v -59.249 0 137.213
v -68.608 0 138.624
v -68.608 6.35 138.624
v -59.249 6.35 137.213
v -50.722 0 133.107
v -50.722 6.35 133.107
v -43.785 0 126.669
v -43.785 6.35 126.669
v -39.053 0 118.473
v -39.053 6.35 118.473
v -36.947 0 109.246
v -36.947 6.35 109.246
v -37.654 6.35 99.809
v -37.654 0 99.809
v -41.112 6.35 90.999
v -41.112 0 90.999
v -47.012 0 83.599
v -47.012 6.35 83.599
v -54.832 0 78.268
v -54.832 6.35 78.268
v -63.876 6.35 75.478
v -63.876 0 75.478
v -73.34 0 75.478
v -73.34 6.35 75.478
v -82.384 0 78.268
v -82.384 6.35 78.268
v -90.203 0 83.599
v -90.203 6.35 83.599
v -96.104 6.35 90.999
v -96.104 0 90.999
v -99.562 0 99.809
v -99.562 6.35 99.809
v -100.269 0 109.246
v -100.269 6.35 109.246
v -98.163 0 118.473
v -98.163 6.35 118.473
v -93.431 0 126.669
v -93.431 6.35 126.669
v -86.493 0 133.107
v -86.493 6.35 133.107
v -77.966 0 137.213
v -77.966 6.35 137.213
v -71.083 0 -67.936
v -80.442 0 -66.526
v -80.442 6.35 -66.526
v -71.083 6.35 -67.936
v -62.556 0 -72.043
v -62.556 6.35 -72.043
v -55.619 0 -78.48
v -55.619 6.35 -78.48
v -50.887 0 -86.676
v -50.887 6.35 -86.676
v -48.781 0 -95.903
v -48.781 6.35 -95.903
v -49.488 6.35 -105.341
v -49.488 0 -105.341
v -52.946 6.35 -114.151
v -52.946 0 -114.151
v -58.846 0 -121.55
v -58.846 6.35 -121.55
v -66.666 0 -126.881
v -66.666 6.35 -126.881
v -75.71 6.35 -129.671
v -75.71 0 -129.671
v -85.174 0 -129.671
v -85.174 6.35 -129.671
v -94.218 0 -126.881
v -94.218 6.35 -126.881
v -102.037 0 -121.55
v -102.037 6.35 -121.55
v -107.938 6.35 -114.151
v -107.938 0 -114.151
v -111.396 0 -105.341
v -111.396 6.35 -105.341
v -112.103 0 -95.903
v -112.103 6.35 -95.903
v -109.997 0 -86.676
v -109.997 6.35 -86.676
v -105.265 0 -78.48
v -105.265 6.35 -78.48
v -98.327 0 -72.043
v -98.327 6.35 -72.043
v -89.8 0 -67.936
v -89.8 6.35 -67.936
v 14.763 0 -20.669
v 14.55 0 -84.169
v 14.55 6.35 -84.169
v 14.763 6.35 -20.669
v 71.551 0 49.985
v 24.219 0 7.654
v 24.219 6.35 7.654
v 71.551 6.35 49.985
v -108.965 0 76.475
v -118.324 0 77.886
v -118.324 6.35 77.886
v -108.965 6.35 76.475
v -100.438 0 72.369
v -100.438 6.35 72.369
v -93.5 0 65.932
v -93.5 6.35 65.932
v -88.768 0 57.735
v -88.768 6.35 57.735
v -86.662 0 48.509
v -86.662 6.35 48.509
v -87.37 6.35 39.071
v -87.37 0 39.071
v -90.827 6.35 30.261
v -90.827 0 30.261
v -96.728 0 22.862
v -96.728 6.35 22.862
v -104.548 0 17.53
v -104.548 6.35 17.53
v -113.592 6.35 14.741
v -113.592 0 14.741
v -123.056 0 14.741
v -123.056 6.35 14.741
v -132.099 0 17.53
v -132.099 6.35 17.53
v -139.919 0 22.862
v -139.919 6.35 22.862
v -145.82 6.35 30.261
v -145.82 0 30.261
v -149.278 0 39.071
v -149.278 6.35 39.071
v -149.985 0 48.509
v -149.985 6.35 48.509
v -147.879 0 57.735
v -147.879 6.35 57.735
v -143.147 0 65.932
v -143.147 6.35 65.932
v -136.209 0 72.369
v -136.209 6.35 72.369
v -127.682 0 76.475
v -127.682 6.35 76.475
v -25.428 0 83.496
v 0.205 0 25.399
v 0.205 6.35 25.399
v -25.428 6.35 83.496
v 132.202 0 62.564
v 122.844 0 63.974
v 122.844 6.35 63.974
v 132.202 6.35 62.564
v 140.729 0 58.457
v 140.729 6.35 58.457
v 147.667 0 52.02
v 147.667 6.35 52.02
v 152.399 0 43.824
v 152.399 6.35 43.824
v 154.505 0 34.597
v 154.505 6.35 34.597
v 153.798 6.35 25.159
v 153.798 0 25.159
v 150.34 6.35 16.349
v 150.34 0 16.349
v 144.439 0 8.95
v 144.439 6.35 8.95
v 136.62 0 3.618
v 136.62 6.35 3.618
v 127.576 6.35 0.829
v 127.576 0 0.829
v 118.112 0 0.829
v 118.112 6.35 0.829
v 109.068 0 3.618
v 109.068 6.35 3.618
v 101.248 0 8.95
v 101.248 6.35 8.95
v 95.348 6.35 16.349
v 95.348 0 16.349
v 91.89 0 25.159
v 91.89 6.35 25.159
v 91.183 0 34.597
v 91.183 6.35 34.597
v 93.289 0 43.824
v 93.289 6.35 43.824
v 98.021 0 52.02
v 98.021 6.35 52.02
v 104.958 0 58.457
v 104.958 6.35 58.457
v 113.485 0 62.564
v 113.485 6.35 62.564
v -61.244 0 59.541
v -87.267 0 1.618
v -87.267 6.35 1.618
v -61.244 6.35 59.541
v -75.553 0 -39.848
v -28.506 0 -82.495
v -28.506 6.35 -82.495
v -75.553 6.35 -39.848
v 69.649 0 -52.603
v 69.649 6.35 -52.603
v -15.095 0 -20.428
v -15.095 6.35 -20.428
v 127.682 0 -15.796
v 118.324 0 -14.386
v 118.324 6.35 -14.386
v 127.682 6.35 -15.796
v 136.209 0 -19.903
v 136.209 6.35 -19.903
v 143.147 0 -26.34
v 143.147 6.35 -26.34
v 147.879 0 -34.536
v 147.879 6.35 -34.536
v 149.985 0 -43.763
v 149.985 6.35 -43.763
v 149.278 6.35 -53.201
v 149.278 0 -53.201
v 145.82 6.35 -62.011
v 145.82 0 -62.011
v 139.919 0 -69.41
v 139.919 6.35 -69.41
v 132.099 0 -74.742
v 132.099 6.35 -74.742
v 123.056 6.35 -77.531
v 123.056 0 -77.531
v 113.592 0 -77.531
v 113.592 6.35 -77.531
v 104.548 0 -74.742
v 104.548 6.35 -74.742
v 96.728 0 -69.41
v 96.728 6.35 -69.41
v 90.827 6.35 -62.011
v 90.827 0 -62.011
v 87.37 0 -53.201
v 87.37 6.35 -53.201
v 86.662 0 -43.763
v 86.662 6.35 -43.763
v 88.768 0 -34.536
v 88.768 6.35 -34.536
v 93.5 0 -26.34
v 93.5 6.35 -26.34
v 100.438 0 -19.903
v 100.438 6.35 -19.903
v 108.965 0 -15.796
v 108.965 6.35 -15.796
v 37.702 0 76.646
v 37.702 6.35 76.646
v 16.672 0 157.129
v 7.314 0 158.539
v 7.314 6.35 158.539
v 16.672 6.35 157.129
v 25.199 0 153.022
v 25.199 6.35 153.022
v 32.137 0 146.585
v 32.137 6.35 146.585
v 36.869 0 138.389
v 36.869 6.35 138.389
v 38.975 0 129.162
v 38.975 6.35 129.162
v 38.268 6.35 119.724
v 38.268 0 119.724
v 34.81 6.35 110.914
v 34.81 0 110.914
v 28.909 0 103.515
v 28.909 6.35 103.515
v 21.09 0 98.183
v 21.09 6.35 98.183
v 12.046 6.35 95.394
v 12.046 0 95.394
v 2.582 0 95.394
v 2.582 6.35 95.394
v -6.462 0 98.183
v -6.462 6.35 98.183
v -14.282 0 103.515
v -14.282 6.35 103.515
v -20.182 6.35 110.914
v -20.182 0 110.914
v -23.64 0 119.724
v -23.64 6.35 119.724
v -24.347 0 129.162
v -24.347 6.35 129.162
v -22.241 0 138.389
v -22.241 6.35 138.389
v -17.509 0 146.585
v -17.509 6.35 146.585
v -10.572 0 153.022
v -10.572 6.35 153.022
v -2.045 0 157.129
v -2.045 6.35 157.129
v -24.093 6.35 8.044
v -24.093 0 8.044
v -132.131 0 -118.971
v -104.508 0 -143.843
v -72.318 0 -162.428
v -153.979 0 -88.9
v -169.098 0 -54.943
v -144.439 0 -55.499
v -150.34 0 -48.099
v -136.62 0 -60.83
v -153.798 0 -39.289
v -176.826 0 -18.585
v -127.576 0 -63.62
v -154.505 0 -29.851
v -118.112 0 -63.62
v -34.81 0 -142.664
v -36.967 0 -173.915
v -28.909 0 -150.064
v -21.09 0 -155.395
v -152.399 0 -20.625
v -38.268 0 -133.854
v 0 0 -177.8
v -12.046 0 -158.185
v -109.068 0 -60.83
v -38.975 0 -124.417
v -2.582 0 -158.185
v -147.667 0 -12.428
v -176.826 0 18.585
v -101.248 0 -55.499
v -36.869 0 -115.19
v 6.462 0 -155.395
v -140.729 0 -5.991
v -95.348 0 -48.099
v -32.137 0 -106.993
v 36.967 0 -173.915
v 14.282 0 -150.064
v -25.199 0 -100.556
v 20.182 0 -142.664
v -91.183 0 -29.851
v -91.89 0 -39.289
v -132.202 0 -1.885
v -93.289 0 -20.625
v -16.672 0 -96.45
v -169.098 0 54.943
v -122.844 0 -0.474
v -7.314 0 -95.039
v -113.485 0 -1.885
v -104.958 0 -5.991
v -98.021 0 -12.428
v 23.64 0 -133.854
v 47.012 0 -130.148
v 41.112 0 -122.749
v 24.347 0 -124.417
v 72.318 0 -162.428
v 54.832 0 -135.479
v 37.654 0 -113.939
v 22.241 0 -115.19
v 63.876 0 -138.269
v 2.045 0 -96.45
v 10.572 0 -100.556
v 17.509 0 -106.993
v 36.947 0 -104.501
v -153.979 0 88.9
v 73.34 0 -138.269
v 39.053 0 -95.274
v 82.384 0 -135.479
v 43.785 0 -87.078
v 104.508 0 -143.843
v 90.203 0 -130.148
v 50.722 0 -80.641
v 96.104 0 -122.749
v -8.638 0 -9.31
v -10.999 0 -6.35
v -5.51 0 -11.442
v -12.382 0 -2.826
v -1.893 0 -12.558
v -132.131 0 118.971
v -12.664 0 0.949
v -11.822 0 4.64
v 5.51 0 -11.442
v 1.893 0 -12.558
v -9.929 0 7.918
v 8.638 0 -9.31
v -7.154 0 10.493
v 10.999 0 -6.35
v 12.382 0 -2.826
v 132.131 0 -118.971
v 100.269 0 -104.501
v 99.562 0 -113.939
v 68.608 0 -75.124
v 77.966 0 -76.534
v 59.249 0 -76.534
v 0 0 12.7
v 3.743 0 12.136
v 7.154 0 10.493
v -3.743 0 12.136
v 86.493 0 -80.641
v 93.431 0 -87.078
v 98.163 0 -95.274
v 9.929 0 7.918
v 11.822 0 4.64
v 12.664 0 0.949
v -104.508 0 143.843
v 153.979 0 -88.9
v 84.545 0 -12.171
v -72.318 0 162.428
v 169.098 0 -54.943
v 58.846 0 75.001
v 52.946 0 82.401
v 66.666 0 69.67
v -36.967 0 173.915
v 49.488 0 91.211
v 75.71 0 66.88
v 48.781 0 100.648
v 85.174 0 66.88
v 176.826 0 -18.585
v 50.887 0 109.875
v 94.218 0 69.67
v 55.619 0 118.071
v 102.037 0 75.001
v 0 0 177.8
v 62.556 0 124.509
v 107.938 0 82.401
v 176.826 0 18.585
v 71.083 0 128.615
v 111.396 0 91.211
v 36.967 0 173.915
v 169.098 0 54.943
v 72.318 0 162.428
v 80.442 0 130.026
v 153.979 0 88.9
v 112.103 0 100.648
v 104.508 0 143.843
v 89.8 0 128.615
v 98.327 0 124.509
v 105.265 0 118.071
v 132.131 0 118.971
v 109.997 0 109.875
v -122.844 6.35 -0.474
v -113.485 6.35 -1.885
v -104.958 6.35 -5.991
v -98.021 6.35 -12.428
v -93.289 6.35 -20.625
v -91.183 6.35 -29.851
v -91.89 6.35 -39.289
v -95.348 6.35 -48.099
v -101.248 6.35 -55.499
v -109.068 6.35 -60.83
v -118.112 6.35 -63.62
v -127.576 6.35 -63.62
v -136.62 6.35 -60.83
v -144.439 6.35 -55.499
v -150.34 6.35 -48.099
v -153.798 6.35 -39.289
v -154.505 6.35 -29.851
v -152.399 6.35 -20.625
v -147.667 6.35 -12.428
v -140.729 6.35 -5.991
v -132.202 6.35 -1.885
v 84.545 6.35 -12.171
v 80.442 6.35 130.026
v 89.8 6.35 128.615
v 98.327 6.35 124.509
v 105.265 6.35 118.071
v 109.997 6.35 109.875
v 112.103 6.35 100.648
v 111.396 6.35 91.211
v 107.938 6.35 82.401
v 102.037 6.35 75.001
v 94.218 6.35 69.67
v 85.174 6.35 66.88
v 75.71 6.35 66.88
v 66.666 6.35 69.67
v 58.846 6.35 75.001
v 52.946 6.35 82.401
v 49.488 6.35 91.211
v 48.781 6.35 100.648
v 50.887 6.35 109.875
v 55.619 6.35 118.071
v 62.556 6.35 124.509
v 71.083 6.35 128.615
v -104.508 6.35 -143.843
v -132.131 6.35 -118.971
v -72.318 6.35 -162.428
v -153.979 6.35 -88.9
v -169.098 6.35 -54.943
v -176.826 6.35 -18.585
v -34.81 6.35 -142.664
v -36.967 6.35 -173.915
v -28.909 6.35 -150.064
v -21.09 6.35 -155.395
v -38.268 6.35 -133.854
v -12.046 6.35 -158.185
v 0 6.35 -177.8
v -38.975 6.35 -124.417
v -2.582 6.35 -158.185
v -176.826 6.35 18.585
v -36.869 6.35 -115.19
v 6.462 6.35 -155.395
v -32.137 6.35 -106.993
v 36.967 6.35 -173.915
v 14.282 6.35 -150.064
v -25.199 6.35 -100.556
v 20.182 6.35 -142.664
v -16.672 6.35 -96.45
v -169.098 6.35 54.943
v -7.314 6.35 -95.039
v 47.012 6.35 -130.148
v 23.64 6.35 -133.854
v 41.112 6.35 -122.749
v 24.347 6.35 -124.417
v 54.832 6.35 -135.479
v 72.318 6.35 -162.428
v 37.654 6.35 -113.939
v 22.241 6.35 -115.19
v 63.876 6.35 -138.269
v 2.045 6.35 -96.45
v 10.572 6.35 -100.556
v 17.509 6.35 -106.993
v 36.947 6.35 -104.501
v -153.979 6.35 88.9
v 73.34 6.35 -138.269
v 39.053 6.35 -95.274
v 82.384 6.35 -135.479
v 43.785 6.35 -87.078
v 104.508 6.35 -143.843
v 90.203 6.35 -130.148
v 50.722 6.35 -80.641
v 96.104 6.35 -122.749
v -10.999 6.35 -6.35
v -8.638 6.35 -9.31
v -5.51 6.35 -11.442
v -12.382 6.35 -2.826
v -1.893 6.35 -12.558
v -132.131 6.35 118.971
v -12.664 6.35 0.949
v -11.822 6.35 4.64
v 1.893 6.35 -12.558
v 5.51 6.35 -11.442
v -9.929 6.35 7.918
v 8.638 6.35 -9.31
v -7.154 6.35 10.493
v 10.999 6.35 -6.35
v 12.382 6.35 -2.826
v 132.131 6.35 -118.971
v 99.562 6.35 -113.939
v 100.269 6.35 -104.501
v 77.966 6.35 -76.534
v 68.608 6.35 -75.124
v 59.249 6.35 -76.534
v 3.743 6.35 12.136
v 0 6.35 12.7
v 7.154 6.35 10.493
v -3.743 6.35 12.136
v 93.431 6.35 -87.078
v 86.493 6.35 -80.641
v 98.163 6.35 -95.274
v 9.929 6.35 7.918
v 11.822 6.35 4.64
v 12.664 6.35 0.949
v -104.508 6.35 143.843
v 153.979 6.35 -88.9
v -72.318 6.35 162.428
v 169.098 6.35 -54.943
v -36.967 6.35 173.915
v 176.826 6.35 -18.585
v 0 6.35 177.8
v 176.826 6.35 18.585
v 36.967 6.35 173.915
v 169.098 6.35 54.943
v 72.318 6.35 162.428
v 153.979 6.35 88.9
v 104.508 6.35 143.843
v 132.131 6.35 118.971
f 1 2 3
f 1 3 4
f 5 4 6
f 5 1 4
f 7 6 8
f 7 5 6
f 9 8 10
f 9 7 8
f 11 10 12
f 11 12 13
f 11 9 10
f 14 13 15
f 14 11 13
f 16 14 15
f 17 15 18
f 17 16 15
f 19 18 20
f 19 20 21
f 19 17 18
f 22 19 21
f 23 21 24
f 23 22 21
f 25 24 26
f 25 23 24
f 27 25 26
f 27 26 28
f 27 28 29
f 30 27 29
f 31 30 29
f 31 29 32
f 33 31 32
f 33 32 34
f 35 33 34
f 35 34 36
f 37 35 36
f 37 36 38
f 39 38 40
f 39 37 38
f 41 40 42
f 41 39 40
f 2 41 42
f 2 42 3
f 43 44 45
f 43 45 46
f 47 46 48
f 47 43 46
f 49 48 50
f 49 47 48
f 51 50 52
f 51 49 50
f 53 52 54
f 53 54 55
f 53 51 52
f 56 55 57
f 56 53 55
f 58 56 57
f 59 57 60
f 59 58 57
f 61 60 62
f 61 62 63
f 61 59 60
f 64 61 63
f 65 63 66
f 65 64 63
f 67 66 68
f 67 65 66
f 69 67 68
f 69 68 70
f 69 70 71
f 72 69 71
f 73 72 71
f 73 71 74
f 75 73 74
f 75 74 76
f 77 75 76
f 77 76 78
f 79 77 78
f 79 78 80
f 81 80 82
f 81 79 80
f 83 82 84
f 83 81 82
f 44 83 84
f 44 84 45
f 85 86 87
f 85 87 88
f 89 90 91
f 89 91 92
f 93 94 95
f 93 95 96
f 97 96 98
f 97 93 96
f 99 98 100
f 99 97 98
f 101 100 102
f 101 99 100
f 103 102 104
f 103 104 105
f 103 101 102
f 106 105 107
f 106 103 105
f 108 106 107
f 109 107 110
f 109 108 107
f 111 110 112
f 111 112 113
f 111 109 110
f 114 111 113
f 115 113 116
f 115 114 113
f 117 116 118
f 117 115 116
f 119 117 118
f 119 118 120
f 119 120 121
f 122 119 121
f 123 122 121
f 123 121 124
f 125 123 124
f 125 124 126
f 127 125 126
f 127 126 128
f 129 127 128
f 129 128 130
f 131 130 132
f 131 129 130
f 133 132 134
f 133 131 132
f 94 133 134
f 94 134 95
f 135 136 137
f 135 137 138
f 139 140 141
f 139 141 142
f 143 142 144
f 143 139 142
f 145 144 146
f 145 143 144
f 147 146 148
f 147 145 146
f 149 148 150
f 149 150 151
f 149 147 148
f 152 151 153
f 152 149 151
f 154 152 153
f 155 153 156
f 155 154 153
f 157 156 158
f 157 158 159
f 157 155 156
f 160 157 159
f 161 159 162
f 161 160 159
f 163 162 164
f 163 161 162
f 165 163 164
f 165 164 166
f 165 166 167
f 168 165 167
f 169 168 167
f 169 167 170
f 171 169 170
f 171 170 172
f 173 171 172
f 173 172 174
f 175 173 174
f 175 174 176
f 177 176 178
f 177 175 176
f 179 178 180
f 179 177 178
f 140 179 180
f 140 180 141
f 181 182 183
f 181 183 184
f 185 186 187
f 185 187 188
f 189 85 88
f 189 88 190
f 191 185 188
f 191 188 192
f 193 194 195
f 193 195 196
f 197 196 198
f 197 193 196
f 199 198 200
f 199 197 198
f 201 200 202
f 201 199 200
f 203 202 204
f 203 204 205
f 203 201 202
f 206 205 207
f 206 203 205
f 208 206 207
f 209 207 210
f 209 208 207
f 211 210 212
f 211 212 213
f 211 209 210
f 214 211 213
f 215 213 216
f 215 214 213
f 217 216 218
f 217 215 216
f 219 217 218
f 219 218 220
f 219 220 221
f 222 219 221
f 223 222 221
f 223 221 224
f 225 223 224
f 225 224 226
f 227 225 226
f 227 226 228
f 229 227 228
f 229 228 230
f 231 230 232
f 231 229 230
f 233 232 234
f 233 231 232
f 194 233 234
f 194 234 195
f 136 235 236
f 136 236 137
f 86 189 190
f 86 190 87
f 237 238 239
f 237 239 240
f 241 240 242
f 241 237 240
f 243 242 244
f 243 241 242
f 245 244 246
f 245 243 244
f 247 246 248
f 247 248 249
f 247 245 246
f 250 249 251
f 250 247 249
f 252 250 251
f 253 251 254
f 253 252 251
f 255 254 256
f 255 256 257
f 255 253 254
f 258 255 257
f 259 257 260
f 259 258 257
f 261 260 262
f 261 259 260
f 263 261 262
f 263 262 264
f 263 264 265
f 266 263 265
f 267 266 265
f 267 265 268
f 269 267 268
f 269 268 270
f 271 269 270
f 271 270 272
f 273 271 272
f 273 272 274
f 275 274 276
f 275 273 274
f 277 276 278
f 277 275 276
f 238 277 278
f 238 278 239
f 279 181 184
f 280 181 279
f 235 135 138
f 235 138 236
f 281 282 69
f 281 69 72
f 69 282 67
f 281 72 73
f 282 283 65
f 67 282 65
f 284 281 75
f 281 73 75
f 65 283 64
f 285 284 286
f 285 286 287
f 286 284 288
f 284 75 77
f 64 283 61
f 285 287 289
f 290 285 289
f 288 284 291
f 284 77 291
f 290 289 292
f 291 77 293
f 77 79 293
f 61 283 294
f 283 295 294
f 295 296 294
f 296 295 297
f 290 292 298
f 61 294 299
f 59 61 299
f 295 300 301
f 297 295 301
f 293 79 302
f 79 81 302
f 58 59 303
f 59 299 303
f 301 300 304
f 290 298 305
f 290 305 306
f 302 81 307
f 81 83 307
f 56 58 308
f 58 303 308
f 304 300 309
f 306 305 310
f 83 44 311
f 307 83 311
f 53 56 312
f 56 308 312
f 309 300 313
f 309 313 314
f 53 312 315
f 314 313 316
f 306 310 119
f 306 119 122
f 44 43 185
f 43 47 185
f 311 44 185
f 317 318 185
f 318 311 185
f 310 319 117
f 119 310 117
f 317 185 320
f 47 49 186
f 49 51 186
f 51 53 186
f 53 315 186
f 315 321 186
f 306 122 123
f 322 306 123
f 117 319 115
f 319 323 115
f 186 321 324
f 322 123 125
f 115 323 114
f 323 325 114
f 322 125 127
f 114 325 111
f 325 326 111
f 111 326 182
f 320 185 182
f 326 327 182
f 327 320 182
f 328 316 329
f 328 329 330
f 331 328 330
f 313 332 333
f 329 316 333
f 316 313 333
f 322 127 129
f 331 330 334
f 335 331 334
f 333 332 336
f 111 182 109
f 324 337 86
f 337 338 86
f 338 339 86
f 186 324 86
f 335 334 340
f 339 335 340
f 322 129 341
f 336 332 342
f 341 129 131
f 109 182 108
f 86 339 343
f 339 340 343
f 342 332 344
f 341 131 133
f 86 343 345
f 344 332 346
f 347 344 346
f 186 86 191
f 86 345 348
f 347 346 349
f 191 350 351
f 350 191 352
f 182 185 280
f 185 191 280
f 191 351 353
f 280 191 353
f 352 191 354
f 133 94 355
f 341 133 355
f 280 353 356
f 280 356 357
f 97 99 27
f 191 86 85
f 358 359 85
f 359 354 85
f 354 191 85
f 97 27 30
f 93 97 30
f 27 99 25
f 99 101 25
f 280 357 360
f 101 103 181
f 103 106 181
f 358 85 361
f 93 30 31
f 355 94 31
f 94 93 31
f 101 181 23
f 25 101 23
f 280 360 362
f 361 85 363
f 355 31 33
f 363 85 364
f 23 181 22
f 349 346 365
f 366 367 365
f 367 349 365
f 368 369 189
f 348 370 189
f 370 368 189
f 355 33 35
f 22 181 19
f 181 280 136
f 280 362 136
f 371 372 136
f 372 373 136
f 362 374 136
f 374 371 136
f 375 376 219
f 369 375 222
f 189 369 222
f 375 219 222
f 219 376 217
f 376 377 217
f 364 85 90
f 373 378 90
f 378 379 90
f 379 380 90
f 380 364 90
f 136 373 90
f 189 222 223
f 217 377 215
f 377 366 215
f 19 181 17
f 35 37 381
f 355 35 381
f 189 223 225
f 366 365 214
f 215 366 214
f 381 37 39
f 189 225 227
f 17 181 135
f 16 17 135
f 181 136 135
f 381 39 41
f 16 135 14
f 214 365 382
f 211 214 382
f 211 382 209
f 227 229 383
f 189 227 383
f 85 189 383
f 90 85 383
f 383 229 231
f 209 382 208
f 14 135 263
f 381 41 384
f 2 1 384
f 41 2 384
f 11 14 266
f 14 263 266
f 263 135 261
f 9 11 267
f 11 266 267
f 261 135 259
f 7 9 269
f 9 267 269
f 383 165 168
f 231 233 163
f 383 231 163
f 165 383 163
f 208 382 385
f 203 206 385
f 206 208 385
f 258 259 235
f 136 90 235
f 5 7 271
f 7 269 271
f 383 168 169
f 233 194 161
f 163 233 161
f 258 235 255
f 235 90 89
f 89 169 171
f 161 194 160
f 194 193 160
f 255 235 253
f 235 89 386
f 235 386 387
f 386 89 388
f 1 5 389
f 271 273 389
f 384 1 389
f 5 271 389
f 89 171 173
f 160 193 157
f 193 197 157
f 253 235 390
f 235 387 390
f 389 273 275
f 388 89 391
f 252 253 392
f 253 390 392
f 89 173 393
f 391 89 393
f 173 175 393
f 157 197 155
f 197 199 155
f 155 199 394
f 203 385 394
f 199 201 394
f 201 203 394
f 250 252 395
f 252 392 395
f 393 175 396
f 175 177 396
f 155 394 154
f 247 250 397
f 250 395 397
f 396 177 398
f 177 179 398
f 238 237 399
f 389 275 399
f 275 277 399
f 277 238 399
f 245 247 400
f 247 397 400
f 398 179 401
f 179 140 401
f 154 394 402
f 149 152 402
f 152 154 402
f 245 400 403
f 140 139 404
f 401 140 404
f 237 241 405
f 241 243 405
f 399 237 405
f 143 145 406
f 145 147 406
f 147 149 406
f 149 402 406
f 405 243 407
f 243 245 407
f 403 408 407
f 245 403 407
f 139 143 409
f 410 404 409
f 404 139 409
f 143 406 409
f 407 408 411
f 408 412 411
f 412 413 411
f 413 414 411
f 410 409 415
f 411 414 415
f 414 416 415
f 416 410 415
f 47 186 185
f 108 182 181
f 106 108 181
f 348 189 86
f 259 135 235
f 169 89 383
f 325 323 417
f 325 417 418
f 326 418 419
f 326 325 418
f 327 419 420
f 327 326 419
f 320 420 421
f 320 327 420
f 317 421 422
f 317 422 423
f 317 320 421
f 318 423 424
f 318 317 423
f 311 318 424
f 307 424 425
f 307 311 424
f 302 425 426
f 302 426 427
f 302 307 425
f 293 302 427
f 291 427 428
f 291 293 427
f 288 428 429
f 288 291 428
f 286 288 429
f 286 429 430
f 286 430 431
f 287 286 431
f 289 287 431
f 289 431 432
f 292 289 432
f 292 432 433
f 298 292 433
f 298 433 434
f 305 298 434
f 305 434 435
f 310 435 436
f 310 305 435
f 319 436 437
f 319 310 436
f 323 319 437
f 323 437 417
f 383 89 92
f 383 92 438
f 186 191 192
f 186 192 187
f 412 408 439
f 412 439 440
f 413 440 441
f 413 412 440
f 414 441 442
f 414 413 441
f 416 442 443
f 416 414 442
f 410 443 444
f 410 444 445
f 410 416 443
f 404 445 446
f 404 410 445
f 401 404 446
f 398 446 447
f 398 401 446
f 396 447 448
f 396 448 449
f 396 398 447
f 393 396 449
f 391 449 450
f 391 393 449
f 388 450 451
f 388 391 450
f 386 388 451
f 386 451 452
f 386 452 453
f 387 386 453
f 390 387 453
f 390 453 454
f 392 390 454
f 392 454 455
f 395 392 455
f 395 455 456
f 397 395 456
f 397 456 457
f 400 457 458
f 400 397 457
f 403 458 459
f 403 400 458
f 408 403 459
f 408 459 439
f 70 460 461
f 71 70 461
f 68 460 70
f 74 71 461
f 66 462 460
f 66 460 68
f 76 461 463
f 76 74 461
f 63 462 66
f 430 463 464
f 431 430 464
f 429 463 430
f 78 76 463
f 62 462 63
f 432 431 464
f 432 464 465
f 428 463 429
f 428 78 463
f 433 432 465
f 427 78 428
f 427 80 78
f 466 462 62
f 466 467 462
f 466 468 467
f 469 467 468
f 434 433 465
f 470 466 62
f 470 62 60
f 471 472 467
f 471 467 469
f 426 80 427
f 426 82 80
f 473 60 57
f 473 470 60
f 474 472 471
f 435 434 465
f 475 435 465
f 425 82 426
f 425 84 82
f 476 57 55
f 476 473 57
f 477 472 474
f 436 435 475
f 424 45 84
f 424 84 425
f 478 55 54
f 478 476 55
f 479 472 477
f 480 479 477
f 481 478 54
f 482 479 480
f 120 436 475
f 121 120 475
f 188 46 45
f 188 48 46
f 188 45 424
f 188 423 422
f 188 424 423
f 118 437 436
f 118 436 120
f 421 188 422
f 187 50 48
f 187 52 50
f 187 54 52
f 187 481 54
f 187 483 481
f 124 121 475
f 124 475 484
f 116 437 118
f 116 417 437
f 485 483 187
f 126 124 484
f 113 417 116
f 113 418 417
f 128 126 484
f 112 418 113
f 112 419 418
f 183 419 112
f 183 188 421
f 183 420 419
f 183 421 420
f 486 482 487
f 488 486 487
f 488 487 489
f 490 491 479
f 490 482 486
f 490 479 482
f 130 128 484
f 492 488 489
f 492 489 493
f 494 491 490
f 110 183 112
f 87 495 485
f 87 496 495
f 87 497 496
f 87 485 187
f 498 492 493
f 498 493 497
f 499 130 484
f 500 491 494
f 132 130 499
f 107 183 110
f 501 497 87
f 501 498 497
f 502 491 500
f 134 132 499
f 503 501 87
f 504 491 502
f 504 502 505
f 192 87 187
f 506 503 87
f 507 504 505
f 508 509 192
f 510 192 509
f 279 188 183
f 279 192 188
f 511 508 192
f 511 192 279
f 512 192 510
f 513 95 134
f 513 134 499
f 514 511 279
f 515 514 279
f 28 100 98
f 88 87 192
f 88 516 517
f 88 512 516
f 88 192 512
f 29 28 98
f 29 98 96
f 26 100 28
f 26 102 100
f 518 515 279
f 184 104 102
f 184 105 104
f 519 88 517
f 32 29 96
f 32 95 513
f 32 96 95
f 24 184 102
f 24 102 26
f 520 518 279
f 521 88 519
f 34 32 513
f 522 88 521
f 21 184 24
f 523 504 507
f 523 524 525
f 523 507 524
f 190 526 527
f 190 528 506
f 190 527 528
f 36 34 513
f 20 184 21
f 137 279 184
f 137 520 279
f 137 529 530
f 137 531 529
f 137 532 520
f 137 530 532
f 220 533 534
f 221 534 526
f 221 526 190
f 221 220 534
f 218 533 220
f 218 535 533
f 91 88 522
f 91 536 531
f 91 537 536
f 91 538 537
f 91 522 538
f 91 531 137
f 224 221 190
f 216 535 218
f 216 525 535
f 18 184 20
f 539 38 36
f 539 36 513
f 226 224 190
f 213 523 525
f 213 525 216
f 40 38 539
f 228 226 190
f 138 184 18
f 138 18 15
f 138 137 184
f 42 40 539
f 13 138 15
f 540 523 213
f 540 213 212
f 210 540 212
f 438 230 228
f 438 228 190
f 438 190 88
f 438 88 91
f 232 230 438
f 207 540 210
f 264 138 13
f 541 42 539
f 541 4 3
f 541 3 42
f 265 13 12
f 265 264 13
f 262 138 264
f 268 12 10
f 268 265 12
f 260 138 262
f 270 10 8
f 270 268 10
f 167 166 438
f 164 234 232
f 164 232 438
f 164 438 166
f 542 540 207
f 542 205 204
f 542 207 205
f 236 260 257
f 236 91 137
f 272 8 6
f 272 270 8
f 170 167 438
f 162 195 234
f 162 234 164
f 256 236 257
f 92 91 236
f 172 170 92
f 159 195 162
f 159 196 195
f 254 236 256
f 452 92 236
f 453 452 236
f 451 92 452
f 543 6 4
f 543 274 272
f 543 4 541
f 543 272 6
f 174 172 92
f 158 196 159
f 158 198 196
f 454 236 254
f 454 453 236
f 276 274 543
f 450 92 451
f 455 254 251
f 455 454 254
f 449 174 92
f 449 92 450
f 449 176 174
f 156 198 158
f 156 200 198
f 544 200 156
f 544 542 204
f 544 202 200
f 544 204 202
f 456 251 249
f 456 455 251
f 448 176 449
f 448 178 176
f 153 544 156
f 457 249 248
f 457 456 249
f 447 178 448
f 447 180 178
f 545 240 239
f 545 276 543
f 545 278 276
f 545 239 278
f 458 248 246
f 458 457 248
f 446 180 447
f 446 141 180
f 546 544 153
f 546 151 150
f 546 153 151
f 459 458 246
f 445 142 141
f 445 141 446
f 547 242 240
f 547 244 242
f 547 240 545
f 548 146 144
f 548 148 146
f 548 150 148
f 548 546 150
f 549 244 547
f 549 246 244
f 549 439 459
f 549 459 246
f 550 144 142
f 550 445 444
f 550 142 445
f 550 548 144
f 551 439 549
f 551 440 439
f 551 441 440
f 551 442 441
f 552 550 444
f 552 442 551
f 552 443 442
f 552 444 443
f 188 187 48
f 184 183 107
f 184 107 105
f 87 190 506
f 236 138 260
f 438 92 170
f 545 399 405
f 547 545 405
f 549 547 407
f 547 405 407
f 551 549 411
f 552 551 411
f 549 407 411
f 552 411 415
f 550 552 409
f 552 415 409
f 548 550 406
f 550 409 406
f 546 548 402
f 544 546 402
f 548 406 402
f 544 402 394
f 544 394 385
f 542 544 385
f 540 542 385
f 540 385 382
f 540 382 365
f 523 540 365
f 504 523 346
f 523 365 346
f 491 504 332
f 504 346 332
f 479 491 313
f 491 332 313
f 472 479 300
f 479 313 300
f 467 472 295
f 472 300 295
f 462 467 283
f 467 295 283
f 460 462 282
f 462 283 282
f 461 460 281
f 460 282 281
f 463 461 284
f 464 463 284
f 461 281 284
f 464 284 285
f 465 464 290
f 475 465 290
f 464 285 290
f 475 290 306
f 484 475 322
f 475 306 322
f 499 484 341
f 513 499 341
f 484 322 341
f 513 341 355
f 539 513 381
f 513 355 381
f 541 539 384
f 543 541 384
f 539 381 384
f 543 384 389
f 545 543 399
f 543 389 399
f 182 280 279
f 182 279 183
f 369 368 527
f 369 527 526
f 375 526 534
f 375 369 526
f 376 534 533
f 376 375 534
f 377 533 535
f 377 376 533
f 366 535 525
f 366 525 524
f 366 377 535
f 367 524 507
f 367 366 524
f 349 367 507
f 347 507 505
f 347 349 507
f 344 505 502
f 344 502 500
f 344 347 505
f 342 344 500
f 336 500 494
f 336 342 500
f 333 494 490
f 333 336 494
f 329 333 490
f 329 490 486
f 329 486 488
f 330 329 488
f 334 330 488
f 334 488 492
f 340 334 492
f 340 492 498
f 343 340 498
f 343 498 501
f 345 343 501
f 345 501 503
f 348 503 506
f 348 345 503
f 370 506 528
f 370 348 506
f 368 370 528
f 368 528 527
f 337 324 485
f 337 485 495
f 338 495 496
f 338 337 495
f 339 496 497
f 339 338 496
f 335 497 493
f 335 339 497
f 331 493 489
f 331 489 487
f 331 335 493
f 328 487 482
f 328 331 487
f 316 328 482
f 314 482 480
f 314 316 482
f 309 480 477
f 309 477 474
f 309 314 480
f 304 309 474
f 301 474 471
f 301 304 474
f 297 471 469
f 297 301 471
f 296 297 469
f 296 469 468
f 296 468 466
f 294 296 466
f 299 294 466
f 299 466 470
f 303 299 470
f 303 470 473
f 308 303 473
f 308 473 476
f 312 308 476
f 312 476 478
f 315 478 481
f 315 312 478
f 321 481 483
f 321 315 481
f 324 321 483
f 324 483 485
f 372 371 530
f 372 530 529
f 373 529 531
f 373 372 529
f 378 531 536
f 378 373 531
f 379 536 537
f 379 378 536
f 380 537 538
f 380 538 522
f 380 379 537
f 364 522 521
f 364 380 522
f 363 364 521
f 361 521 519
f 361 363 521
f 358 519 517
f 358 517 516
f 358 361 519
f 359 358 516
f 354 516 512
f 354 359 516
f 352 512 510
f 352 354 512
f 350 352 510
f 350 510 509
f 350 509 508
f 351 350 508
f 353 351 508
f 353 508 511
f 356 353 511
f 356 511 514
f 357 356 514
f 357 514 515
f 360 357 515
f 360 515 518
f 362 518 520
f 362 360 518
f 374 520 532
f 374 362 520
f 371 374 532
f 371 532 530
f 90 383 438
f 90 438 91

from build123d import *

# Parameters (mm, degrees)
SKETCH1_R           = 177.8
SKETCH1_R_2         = 31.75
SKETCH1_R_3         = 12.7
BOSS_EXTRUDE1_DEPTH = 6.35


with BuildPart() as part:
    # Sketch1 → Boss-Extrude1 (new body)
    with BuildSketch(Plane(origin=(0, 0, 0), x_dir=(1, 0, 0), z_dir=(0, 1, 0))):
        with Locations(Location((0, 0, 0), (0, 0, 270))):
            Circle(SKETCH1_R)
        with Locations(Location((-80.441860309, 98.275668962, 0), (0, 0, 270))):
            Circle(SKETCH1_R_2, mode=Mode.SUBTRACT)
        with Locations(Location((-7.313843174, 126.789225481, 0), (0, 0, 270))):
            Circle(SKETCH1_R_2, mode=Mode.SUBTRACT)
        with Locations(Location((68.607813465, 106.873607273, 0), (0, 0, 270))):
            Circle(SKETCH1_R_2, mode=Mode.SUBTRACT)
        with Locations(Location((118.323617255, 46.135903587, 0), (0, 0, 270))):
            Circle(SKETCH1_R_2, mode=Mode.SUBTRACT)
        with Locations(Location((122.843820924, -32.224147168, 0), (0, 0, 270))):
            Circle(SKETCH1_R_2, mode=Mode.SUBTRACT)
        with Locations(Location((80.441860309, -98.275668962, 0), (0, 0, 270))):
            Circle(SKETCH1_R_2, mode=Mode.SUBTRACT)
        with Locations(Location((7.313843174, -126.789225481, 0), (0, 0, 270))):
            Circle(SKETCH1_R_2, mode=Mode.SUBTRACT)
        with Locations(Location((-68.607813465, -106.873607273, 0), (0, 0, 270))):
            Circle(SKETCH1_R_2, mode=Mode.SUBTRACT)
        with Locations(Location((-118.323617255, -46.135903587, 0), (0, 0, 270))):
            Circle(SKETCH1_R_2, mode=Mode.SUBTRACT)
        with Locations(Location((-122.843820924, 32.224147168, 0), (0, 0, 270))):
            Circle(SKETCH1_R_2, mode=Mode.SUBTRACT)
        with Locations(Location((0, 0, 0), (0, 0, 270))):
            Circle(SKETCH1_R_3, mode=Mode.SUBTRACT)
        Polygon((84.545380805, 12.171415864), (24.219453502, -7.6536313), (71.551411628, -49.984893269), align=None, mode=Mode.SUBTRACT)
        Polygon((14.550255095, 84.168609684), (14.763258648, 20.668966934), (69.649060625, 52.603254797), align=None, mode=Mode.SUBTRACT)
        Polygon((37.701663834, -76.646260989), (0.205186805, -25.399171214), (-25.427856295, -83.495617761), align=None, mode=Mode.SUBTRACT)
        Polygon((-61.244471123, -59.541410266), (-24.092641082, -8.043919797), (-87.26669108, -1.618236419), align=None, mode=Mode.SUBTRACT)
        Polygon((-75.552828611, 39.847645707), (-15.095257873, 20.427755377), (-28.505924878, 82.495492653), align=None, mode=Mode.SUBTRACT)
    extrude(amount=BOSS_EXTRUDE1_DEPTH)


solid = part.part
